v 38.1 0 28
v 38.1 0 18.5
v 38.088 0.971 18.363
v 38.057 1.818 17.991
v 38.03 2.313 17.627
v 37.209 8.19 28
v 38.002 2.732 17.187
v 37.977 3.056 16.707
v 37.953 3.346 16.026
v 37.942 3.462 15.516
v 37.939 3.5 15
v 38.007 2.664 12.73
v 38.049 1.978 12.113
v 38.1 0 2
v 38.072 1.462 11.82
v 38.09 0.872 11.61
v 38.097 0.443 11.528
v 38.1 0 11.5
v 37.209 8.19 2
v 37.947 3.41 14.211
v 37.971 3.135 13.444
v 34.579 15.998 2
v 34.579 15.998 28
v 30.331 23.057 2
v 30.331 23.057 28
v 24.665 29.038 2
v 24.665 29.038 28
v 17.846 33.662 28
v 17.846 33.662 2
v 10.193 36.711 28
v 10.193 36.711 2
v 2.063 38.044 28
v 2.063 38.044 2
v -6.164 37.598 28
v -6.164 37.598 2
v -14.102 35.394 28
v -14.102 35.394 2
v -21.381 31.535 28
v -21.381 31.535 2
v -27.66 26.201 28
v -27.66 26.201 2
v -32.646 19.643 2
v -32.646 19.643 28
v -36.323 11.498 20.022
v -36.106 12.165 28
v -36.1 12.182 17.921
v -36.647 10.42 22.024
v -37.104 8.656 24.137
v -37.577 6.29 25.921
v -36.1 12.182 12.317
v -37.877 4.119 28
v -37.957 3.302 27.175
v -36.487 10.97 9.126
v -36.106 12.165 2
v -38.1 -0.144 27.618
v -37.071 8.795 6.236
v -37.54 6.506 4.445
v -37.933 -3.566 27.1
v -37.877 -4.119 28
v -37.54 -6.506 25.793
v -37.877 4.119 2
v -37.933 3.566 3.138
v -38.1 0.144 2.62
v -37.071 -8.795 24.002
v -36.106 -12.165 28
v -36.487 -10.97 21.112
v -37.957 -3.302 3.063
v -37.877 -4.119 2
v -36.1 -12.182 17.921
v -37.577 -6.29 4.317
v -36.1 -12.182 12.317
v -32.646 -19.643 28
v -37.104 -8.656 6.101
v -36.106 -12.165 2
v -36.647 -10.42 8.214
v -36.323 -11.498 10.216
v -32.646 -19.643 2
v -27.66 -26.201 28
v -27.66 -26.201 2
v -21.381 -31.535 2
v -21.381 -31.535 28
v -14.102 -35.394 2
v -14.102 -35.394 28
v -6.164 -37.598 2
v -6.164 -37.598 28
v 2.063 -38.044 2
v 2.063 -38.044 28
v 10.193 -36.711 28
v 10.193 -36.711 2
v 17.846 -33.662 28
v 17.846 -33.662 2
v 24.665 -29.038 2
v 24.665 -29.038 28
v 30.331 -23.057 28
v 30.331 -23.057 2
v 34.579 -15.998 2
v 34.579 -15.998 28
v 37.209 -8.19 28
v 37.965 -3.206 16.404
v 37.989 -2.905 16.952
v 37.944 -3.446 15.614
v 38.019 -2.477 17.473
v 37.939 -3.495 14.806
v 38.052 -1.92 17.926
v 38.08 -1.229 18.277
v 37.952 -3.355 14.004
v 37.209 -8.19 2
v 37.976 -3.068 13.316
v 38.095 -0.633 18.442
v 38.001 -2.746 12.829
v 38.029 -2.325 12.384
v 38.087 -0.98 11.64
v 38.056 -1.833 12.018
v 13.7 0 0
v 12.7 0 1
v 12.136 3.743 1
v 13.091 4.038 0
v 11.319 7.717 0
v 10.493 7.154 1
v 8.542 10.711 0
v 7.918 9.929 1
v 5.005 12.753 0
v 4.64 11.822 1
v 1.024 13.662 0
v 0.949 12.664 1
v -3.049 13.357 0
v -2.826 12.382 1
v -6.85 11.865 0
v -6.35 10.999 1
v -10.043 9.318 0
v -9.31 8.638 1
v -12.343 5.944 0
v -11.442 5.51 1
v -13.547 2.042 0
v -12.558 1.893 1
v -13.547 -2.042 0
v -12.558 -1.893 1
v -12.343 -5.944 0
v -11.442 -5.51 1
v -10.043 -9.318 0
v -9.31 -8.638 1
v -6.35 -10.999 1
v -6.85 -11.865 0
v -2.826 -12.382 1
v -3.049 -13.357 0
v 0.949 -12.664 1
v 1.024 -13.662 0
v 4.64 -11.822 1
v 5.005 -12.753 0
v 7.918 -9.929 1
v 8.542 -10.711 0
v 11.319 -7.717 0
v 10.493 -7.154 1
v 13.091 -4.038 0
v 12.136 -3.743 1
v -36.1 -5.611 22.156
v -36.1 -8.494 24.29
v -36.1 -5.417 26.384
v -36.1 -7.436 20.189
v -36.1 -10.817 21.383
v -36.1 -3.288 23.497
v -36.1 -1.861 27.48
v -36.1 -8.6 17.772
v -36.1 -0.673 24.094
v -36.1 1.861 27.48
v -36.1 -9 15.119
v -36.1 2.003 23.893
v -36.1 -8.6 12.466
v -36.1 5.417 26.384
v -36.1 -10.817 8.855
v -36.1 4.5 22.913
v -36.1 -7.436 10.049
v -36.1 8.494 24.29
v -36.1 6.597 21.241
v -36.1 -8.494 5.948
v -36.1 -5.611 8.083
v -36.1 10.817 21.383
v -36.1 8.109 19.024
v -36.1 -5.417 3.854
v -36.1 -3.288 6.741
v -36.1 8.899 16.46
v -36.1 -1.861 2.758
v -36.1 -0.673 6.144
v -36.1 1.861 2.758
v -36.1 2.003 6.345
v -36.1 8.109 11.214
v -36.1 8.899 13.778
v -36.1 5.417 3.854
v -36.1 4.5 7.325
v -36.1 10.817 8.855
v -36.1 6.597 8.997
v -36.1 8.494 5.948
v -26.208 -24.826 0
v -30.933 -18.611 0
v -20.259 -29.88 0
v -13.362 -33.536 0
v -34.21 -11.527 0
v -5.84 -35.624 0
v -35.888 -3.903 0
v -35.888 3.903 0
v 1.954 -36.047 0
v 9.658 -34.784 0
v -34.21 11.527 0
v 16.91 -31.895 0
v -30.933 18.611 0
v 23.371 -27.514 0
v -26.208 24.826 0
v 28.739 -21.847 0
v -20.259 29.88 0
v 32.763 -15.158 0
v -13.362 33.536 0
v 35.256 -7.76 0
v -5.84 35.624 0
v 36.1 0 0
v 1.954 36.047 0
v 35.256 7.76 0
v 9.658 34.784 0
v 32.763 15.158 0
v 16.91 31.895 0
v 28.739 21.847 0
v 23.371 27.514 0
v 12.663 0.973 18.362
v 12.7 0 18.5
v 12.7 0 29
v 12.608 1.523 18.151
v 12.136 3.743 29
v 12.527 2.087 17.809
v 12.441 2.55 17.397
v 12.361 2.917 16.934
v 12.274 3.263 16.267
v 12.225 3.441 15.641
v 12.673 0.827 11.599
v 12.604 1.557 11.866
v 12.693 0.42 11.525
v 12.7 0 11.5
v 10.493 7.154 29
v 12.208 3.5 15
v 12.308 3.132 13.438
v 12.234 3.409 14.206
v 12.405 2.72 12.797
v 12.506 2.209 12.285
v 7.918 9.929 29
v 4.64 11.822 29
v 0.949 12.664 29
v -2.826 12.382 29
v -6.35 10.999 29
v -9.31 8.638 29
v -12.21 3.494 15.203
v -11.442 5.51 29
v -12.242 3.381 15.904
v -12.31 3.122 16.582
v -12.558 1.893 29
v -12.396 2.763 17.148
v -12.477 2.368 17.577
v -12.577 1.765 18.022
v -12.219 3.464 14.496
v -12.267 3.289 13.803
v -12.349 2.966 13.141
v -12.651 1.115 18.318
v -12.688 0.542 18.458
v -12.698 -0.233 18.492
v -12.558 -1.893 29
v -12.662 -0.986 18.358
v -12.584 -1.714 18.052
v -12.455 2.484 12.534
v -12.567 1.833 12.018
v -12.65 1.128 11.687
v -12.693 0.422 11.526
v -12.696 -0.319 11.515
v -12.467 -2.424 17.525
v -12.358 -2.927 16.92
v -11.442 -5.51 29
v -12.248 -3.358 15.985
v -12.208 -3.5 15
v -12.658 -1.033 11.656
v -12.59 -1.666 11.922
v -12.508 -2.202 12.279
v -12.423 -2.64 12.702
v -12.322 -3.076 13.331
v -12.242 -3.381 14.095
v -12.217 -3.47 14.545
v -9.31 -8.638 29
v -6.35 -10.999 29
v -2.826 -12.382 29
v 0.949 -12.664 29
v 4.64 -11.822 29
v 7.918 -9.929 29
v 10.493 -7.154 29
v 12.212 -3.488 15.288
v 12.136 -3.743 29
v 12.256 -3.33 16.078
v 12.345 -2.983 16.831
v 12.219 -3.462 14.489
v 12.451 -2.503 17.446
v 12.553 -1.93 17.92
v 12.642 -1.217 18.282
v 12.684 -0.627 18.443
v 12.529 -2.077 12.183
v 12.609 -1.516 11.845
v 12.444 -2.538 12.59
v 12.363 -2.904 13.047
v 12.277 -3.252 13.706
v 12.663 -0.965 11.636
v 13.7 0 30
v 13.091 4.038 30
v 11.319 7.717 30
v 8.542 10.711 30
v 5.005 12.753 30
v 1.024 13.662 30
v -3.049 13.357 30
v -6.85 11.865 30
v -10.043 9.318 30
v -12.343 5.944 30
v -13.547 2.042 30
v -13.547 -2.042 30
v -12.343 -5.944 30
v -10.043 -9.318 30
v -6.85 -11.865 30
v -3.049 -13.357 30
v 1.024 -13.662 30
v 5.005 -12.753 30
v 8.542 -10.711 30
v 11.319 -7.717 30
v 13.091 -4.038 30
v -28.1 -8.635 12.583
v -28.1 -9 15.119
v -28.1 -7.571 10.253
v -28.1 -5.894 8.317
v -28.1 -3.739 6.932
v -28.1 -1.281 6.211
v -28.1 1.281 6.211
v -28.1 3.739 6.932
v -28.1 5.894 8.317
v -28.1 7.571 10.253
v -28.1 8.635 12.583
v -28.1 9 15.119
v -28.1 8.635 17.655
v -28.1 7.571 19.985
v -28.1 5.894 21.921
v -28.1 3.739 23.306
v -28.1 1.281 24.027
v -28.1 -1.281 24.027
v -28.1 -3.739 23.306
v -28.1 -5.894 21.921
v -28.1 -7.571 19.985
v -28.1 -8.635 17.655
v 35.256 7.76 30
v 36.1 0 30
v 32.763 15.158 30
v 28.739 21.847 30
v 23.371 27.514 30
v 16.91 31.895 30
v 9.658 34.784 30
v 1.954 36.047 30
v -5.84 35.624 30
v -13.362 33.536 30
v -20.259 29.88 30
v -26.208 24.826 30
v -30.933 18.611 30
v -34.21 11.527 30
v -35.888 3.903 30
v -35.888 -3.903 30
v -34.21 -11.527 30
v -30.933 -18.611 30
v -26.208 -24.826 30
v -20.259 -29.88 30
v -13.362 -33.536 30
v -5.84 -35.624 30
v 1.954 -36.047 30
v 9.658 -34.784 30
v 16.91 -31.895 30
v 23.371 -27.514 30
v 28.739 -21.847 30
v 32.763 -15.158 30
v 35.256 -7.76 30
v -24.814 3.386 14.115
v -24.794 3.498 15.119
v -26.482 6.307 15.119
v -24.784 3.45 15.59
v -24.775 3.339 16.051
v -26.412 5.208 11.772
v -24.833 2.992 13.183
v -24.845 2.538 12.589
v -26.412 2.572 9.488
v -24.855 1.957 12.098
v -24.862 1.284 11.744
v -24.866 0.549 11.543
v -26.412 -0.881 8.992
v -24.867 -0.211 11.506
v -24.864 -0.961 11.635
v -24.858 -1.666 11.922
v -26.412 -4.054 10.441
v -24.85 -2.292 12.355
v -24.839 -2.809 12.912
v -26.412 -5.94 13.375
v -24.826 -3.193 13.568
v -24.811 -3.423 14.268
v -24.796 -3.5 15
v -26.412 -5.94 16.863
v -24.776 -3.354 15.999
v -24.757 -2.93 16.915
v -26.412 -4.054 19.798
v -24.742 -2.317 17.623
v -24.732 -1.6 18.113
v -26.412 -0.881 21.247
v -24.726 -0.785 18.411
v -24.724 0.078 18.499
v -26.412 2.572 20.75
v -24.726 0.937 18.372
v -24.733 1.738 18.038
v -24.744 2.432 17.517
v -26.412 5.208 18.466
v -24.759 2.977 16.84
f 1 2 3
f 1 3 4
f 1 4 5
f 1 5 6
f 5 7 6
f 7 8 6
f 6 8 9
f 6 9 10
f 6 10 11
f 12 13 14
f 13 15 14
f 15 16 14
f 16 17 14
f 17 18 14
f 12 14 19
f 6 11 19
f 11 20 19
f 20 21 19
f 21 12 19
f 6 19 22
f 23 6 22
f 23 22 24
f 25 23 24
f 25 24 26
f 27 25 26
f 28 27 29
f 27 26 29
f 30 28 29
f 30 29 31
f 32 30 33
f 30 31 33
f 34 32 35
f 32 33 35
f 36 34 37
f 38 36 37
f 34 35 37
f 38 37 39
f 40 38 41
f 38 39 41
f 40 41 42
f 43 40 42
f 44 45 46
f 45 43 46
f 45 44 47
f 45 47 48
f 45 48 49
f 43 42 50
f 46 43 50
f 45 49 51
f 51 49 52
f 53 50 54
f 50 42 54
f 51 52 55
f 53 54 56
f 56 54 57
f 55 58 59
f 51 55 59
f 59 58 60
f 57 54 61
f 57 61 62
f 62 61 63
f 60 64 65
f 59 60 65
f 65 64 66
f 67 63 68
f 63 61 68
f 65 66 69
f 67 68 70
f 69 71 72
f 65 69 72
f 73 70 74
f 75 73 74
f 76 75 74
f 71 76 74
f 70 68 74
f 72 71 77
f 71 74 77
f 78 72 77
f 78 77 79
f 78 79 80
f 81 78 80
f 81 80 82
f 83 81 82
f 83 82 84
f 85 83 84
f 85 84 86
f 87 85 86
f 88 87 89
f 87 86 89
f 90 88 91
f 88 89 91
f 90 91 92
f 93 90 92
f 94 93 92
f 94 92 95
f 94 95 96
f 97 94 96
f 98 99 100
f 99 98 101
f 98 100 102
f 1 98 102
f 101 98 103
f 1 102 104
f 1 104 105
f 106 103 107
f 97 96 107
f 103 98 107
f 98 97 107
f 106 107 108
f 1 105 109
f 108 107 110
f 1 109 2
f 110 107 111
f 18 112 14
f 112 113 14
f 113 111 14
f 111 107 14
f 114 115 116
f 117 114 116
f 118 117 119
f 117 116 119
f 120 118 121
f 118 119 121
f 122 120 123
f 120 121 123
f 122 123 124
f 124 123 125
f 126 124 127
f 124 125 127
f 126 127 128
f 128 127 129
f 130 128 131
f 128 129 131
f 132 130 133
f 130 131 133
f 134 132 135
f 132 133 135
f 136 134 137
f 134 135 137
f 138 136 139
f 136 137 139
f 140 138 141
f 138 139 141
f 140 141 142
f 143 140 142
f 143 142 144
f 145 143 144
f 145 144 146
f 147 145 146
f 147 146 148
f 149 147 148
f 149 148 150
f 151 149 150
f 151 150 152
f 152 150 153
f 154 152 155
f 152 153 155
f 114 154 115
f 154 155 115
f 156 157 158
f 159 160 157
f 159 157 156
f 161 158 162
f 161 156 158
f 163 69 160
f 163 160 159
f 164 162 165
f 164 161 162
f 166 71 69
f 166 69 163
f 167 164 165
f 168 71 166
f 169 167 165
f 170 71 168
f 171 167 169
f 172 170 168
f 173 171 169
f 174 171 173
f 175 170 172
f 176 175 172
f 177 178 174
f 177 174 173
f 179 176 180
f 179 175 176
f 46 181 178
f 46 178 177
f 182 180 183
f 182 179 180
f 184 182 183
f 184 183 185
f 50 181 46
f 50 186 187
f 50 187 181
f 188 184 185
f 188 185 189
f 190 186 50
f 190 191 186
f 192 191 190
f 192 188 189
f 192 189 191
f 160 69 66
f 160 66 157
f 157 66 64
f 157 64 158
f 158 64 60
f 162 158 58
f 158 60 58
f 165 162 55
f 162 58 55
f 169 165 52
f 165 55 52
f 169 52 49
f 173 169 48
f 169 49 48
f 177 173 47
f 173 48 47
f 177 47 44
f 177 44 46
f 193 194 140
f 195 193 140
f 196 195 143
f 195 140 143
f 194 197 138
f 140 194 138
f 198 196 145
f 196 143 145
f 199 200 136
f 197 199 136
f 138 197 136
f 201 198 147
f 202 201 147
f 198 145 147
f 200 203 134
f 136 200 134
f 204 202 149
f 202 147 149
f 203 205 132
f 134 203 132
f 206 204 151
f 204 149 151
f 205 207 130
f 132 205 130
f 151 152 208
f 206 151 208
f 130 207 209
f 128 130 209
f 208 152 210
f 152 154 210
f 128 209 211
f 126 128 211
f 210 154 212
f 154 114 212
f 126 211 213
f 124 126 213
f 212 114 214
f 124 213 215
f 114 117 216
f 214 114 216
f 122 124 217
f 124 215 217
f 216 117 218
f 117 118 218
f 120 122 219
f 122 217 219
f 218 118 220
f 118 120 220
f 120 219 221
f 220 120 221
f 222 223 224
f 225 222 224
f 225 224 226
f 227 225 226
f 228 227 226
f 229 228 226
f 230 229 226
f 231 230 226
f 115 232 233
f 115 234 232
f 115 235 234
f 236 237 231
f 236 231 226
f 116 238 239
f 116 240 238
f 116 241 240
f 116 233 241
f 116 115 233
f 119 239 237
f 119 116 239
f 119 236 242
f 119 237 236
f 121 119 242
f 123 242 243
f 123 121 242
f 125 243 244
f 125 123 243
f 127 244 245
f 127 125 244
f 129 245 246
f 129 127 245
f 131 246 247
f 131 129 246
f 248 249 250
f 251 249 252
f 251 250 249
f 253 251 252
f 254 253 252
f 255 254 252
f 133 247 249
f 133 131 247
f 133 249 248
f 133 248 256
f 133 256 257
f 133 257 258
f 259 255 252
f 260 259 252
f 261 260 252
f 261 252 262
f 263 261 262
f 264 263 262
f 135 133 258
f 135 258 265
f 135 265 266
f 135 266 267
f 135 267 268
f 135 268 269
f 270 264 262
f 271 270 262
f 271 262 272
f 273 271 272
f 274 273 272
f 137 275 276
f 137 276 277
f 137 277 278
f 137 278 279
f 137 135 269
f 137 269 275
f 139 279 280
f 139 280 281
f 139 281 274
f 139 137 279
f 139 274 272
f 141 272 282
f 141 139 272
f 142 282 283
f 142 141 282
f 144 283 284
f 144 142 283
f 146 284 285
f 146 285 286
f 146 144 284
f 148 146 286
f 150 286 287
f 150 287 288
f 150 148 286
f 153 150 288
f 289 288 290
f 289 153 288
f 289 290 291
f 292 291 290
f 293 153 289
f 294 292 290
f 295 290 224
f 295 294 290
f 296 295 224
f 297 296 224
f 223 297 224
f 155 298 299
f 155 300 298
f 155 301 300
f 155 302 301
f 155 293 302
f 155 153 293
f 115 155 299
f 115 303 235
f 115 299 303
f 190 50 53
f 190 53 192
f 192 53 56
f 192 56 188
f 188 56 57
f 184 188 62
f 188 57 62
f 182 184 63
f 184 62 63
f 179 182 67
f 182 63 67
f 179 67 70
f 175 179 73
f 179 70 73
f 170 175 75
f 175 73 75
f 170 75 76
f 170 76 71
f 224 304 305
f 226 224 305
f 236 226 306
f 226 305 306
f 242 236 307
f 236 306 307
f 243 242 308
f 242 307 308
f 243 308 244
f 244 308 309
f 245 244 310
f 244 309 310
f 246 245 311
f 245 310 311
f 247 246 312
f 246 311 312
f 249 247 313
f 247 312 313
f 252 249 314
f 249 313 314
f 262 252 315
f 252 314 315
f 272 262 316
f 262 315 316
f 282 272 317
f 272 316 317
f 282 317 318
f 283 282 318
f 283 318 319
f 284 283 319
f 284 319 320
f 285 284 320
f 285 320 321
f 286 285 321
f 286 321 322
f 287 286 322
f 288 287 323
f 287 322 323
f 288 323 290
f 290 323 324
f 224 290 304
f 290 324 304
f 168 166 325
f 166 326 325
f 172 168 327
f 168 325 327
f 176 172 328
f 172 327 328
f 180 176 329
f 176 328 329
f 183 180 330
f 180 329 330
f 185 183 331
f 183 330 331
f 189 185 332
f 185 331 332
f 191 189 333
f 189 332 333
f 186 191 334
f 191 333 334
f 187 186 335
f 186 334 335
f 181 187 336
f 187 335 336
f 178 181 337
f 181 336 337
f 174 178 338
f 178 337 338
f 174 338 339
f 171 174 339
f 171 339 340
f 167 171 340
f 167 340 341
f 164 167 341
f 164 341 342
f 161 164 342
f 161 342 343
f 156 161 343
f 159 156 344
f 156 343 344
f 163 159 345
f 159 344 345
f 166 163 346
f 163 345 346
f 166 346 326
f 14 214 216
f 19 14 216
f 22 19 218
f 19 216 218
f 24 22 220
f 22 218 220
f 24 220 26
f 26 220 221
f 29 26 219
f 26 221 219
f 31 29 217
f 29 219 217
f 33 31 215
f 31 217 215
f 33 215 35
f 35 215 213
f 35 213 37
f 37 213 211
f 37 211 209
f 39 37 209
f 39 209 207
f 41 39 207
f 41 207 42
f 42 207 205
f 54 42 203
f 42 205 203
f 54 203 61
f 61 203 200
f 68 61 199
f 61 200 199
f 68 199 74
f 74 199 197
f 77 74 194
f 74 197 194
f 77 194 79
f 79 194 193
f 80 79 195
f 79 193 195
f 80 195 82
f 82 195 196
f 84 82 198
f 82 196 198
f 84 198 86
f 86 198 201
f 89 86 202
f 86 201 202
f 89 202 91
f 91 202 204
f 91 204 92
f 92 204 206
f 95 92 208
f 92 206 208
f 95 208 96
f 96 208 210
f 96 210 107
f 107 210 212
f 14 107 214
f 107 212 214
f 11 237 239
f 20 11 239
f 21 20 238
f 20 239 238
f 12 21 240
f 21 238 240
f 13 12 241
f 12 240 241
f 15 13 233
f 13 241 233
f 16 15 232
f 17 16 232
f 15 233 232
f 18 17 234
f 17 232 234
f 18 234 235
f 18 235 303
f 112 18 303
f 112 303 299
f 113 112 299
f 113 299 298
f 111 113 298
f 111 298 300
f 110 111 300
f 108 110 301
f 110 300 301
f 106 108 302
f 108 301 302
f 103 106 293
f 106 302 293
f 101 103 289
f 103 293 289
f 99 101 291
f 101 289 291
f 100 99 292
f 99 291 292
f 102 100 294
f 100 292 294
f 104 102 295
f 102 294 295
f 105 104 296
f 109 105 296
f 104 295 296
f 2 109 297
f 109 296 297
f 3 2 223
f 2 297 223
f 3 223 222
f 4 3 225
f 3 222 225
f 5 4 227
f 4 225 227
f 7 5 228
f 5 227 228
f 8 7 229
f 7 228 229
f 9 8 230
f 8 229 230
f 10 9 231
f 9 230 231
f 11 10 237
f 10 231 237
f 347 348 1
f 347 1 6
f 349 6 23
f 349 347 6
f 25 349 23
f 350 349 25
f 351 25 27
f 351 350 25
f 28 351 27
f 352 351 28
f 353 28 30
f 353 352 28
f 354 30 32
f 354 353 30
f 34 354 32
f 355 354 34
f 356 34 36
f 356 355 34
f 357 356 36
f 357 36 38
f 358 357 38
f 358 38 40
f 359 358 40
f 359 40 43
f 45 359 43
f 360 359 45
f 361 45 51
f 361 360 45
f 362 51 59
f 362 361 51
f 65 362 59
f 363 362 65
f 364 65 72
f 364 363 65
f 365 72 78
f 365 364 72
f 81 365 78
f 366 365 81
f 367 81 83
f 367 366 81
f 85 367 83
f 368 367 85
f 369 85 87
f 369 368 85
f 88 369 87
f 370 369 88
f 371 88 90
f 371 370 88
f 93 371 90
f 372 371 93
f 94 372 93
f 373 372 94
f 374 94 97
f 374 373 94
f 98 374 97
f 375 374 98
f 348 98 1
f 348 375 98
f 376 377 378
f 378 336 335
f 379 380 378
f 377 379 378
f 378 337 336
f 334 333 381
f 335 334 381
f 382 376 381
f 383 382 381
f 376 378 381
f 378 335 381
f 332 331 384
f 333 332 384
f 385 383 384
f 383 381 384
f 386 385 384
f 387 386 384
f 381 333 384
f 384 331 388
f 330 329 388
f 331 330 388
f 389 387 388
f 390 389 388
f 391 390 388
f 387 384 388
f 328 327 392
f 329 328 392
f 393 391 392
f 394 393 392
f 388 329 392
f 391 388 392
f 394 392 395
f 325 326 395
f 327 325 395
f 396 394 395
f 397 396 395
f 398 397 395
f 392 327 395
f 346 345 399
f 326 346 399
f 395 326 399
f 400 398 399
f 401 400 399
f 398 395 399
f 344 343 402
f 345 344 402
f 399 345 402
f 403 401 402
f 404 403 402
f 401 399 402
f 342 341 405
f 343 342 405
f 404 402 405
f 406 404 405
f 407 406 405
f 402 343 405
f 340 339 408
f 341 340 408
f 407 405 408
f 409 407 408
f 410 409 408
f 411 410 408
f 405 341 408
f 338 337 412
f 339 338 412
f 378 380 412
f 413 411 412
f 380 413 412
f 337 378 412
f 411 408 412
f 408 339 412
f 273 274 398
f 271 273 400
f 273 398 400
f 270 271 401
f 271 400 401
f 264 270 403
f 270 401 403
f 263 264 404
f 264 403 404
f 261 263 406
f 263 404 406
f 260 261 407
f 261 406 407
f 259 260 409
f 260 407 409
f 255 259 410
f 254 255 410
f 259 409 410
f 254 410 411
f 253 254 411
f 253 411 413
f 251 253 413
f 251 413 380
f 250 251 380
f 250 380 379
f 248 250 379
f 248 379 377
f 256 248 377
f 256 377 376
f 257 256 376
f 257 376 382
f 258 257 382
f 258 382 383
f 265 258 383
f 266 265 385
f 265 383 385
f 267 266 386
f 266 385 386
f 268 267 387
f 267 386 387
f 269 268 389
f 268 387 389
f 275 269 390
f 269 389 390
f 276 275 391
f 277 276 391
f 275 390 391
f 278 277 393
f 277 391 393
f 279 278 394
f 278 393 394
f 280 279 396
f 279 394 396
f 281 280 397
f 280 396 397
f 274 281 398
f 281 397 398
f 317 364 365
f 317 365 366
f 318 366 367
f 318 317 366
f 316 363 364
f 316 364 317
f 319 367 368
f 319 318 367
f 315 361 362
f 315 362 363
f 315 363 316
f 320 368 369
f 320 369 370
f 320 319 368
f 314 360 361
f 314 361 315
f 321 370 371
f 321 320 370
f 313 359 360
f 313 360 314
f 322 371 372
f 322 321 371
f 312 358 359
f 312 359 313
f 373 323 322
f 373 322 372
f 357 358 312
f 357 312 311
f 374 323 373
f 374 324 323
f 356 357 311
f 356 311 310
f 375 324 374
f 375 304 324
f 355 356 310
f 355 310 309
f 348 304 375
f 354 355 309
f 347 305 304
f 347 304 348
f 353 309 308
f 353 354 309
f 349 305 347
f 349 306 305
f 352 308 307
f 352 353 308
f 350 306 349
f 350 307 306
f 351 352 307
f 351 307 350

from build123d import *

# Parameters (mm, degrees)
F0_R           = 38.1
F0_R_2         = 12.7
F1_DEPTH       = 30
F2_SIZE        = 2
F4_D           = 7
F4_DEPTH       = 38.101
F5_D           = 7
F8_D           = 18
F8_DEPTH       = 10
F8_CBORE_D     = 25
F8_CBORE_DEPTH = 2
F8_TIP         = 5.4077455712
F9_SIZE        = 1


# Not quite as in the source:
# - a length typed as a fraction of an inch, garbled in the dataset ("3 / 203.2 mm" for 3/8 in), is restored


with BuildPart() as f1:
    # F0 (on Top) → F1 (new body)
    with BuildSketch(Plane.XY):
        Circle(F0_R)
        Circle(F0_R_2, mode=Mode.SUBTRACT)
    extrude(amount=F1_DEPTH)

    # F2
    f2_edges = [f1.edges().sort_by_distance(p)[0] for p in [
        (-38.1, 0, 30),
        (-38.1, 0, 0),
    ]]
    chamfer(f2_edges, length=F2_SIZE)

    # F4 (through all, one way)
    with BuildSketch(Plane(origin=(0, 0, 0), x_dir=(0, 1, 0), z_dir=(-1, 0, 0))):
        with Locations((0, -15)):
            Circle(F4_D / 2)
    extrude(amount=-F4_DEPTH, mode=Mode.SUBTRACT)

    # F5 (through all)
    with Locations(Plane.YZ):
        with Locations((0, 15)):
            Hole(F5_D / 2)

    # F8
    with Locations(Plane(origin=(-38.1, 0, 0), x_dir=(0, 1, 0), z_dir=(-1, 0, 0))):
        with Locations((0, -15.1190431789)):
            CounterBoreHole(F8_D / 2, F8_CBORE_D / 2, F8_CBORE_DEPTH, depth=F8_DEPTH)
            with Locations((0, 0, -(F8_DEPTH + F8_TIP / 2))):  # 118° drill point
                Cone(0, F8_D / 2, F8_TIP, mode=Mode.SUBTRACT)

    # F9
    f9_edges = [f1.edges().sort_by_distance(p)[0] for p in [
        (-12.7, 0, 0),
        (-12.7, 0, 30),
    ]]
    chamfer(f9_edges, length=F9_SIZE)


solid = f1.part
